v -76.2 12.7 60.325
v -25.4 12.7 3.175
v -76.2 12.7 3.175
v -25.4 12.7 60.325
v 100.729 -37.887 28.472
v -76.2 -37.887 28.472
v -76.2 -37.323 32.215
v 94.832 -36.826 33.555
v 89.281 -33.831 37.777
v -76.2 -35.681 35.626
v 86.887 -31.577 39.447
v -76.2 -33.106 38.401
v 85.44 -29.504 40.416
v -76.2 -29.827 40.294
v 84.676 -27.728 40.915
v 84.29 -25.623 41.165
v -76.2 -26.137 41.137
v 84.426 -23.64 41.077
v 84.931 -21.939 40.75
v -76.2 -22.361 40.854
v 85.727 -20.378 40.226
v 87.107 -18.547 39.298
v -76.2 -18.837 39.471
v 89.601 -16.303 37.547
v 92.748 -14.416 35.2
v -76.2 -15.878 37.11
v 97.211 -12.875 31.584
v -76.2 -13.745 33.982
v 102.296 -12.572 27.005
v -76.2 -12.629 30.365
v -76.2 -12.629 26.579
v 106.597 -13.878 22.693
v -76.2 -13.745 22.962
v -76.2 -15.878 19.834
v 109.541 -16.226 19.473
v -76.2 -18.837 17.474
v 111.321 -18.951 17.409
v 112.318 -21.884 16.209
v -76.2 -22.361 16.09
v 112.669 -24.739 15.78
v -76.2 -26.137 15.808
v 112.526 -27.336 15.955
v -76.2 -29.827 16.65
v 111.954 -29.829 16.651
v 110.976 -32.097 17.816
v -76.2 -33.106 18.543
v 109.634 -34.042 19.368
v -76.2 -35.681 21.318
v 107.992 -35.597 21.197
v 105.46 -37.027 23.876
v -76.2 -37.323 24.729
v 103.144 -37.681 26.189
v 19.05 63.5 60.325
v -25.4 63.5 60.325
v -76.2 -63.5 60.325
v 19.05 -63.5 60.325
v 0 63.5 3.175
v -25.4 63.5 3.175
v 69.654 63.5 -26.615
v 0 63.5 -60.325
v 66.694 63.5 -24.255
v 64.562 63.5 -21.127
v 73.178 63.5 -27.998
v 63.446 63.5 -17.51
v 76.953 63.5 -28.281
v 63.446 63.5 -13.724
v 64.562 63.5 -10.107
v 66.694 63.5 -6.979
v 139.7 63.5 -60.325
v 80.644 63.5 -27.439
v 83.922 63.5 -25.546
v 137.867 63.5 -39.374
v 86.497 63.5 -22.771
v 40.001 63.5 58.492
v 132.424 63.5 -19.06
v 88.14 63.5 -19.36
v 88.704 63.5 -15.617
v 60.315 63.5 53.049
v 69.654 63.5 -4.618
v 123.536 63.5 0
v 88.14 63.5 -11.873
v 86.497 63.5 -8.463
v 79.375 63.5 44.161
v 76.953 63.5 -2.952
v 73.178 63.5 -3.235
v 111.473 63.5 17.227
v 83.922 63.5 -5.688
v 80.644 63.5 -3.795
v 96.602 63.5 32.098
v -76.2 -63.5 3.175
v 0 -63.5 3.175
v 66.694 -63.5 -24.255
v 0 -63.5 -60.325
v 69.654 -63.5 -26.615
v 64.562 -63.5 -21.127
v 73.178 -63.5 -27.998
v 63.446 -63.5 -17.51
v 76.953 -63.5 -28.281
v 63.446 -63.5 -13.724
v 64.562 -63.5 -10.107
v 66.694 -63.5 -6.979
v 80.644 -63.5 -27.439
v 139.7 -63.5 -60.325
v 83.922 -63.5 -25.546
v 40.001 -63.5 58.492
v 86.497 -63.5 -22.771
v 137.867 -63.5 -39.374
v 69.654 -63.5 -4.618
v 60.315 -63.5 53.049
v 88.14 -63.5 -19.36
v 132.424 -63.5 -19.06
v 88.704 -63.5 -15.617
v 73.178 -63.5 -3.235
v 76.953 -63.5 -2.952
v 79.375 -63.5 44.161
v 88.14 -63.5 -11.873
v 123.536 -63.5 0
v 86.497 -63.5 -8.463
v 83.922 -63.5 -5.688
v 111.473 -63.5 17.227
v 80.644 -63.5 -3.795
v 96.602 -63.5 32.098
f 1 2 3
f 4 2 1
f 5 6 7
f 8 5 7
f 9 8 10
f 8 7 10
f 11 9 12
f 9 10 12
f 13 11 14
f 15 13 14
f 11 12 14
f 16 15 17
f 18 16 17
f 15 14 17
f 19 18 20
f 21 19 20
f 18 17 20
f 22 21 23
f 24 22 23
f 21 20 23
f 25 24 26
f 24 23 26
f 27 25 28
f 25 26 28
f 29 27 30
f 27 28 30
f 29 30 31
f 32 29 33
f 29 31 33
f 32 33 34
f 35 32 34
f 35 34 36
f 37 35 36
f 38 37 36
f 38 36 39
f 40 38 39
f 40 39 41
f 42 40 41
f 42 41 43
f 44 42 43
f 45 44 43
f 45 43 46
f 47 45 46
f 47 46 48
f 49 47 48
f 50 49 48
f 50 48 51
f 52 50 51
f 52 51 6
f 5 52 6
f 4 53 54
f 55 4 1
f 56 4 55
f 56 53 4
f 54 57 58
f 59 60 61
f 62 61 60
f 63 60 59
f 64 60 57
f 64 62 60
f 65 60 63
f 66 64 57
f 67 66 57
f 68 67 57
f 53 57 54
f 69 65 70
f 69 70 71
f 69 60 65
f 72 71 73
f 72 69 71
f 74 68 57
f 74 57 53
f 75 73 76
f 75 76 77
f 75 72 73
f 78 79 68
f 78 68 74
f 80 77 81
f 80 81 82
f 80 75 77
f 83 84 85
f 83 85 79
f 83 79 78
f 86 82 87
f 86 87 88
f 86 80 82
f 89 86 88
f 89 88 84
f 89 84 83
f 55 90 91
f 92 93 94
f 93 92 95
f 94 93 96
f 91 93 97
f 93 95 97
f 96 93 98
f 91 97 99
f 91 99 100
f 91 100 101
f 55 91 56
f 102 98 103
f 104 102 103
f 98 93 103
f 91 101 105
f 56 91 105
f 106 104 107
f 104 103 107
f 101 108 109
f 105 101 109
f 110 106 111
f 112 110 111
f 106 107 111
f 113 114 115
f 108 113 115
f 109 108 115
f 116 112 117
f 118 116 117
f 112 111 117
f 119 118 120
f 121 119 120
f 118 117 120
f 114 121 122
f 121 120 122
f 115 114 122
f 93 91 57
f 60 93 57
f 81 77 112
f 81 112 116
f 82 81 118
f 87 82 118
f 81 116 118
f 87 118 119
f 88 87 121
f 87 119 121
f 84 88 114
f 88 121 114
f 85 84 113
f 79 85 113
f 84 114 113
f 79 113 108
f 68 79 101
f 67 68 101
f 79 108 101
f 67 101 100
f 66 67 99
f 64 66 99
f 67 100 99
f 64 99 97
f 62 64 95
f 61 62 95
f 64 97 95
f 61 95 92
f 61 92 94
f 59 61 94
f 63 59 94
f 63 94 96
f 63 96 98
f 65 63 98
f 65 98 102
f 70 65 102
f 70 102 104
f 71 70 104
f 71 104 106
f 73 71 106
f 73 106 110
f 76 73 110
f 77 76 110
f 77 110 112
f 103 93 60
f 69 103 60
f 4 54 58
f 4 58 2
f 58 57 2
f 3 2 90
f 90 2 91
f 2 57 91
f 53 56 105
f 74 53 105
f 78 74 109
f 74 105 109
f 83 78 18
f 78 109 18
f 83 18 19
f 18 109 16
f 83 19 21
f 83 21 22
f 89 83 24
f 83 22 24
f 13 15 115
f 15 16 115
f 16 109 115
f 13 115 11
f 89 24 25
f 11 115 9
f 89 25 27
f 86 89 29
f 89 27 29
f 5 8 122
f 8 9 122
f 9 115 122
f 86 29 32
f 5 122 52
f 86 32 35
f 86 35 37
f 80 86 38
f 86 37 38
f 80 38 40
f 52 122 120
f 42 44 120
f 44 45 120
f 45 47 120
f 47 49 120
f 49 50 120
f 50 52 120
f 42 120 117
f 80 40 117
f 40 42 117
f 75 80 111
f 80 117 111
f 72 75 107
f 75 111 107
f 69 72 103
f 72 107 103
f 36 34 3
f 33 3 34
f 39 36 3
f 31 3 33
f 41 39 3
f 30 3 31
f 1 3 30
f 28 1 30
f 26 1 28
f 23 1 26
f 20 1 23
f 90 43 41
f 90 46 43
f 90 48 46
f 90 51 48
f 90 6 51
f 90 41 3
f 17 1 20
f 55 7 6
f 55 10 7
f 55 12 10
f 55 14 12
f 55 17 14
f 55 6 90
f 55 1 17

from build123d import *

# Parameters (mm, degrees)
F0_W      = 127
F0_H      = 120.65
F1_DEPTH  = 139.7
F2_W      = 76.2
F2_H      = 57.15
F3_DEPTH  = 76.2
F5_DEPTH  = 127.001
F6_W      = 50.8
F6_H      = 57.15
F7_DEPTH  = 25.4
F9_R      = 12.7
F10_DEPTH = 215.901
F11_R     = 12.7
F12_DEPTH = 127.001


with BuildPart() as f1:
    # F0 (on Right) → F1 (new body)
    with BuildSketch(Plane.YZ):
        Rectangle(F0_W, F0_H)
    extrude(amount=F1_DEPTH)

    # F2 (on face) → F3 (join)
    with BuildSketch(Plane(origin=(0, 0, 0), x_dir=(0, -1, 0), z_dir=(-1, 0, 0))):
        with Locations((25.4, 31.75)):
            Rectangle(F2_W, F2_H)
    extrude(amount=F3_DEPTH)

    # F4 (on face) → F5 (cut, through all)
    with BuildSketch(Plane.XZ.offset(63.5)):
        with BuildLine():
            ThreePointArc((19.05, 60.325), (104.362433, 24.987433), (139.7, -60.325))
            Line((139.7, -60.325), (139.7, 60.325))
            Line((139.7, 60.325), (19.05, 60.325))
        make_face()
    extrude(amount=-F5_DEPTH, mode=Mode.SUBTRACT)

    # F6 (on face) → F7 (join)
    with BuildSketch(Plane(origin=(0, 0, 0), x_dir=(0, -1, 0), z_dir=(-1, 0, 0))):
        with Locations((-38.1, 31.75)):
            Rectangle(F6_W, F6_H)
    extrude(amount=F7_DEPTH)

    # F9 (on face) → F10 (cut, through all)
    with BuildSketch(Plane(origin=(-76.2, 0, 0), x_dir=(0, -1, 0), z_dir=(-1, 0, 0))):
        with Locations((25.187448, 28.472066)):
            Circle(F9_R)
    extrude(amount=-F10_DEPTH, mode=Mode.SUBTRACT)

    # F11 (on face) → F12 (cut, through all)
    with BuildSketch(Plane.XZ.offset(63.5)):
        with Locations((76.003939, -15.616879)):
            Circle(F11_R)
    extrude(amount=-F12_DEPTH, mode=Mode.SUBTRACT)


solid = f1.part
